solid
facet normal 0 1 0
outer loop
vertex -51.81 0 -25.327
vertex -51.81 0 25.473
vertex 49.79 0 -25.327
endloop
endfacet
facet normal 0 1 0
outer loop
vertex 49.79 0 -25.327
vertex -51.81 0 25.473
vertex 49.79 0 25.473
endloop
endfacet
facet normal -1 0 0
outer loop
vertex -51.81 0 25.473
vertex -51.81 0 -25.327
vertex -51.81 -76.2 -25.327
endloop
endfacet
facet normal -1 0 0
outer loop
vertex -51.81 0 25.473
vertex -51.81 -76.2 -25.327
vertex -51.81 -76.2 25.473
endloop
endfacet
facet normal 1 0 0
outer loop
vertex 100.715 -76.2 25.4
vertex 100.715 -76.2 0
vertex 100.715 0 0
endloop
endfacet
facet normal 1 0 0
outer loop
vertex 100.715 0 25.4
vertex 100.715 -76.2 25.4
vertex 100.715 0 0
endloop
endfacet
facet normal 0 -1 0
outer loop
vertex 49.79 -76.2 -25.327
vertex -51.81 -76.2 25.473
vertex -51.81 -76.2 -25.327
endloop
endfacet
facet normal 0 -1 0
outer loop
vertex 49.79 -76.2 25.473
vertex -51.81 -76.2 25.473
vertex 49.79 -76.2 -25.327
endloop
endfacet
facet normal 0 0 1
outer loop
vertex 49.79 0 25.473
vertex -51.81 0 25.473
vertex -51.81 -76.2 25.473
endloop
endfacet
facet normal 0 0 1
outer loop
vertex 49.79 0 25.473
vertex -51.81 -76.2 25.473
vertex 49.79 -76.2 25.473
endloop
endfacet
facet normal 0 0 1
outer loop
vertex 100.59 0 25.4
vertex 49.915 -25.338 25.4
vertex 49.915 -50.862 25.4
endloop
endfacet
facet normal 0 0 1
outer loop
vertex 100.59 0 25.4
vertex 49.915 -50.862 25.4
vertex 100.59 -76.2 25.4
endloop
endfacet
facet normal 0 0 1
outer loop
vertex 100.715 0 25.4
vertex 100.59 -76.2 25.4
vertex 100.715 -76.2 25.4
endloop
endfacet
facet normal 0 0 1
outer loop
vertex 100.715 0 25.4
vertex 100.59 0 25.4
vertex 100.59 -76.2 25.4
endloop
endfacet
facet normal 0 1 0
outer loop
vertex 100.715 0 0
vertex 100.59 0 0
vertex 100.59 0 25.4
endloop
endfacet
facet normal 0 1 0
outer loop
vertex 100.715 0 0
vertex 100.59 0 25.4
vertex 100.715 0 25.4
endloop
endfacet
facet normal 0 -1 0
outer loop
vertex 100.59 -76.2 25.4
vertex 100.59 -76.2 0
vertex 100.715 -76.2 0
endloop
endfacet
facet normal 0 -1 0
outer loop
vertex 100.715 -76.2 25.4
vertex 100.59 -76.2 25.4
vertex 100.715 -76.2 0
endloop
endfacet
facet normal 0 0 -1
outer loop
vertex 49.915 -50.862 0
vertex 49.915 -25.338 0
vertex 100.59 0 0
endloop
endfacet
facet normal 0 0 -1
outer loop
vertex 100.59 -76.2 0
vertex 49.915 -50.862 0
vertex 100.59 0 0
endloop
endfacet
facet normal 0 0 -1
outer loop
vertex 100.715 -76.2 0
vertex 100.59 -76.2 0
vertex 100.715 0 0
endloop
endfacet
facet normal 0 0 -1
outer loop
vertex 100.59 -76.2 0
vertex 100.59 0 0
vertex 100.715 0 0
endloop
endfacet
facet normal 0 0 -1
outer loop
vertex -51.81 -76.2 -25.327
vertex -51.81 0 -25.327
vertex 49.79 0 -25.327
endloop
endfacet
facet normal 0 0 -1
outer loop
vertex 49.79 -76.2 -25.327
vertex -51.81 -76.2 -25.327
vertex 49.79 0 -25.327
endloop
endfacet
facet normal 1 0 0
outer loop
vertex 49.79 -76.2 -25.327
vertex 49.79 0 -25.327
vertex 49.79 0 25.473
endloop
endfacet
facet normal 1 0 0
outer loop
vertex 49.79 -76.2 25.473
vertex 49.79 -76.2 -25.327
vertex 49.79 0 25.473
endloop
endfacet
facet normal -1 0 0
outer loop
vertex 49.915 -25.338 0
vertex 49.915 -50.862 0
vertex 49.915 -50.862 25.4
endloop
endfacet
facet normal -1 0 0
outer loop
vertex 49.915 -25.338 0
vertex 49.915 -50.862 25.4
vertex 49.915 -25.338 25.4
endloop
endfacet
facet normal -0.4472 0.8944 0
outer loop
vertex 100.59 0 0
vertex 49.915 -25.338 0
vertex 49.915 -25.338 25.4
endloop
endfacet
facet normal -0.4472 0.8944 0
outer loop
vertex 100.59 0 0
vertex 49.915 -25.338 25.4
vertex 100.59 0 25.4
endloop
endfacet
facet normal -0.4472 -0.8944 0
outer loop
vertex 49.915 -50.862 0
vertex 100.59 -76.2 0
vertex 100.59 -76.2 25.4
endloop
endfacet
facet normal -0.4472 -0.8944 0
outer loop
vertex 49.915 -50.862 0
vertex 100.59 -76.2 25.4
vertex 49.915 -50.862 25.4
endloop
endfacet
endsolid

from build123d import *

# Parameters (mm, degrees)
F0_W     = 101.6
F0_H     = 50.8
F1_DEPTH = 76.2
F3_W     = 50.8
F3_H     = 76.2
F4_DEPTH = 25.4
F5_DEPTH = 25.4


with BuildPart() as f1:
    # F0 (on Front) → F1 (new body)
    with BuildSketch(Plane.XZ):
        with Locations((-1.009606, 0.073093)):
            Rectangle(F0_W, F0_H)
    extrude(amount=F1_DEPTH)


with BuildPart() as f4:
    # F3 (on Top) → F4 (new body)
    with BuildSketch(Plane.XY):
        with Locations((75.315385, -38.1)):
            Rectangle(F3_W, F3_H)
    extrude(amount=F4_DEPTH)

    # F2 (on Top) → F5 (cut, through all)
    with BuildSketch(Plane.XY):
        Polygon((49.790394, -25.4), (100.590394, 0), (49.790394, 0), align=None)
        Polygon((49.790394, -50.8), (49.790394, -76.2), (100.590394, -76.2), align=None)
    extrude(amount=F5_DEPTH, mode=Mode.SUBTRACT)


solid = Compound([f1.part, f4.part])
